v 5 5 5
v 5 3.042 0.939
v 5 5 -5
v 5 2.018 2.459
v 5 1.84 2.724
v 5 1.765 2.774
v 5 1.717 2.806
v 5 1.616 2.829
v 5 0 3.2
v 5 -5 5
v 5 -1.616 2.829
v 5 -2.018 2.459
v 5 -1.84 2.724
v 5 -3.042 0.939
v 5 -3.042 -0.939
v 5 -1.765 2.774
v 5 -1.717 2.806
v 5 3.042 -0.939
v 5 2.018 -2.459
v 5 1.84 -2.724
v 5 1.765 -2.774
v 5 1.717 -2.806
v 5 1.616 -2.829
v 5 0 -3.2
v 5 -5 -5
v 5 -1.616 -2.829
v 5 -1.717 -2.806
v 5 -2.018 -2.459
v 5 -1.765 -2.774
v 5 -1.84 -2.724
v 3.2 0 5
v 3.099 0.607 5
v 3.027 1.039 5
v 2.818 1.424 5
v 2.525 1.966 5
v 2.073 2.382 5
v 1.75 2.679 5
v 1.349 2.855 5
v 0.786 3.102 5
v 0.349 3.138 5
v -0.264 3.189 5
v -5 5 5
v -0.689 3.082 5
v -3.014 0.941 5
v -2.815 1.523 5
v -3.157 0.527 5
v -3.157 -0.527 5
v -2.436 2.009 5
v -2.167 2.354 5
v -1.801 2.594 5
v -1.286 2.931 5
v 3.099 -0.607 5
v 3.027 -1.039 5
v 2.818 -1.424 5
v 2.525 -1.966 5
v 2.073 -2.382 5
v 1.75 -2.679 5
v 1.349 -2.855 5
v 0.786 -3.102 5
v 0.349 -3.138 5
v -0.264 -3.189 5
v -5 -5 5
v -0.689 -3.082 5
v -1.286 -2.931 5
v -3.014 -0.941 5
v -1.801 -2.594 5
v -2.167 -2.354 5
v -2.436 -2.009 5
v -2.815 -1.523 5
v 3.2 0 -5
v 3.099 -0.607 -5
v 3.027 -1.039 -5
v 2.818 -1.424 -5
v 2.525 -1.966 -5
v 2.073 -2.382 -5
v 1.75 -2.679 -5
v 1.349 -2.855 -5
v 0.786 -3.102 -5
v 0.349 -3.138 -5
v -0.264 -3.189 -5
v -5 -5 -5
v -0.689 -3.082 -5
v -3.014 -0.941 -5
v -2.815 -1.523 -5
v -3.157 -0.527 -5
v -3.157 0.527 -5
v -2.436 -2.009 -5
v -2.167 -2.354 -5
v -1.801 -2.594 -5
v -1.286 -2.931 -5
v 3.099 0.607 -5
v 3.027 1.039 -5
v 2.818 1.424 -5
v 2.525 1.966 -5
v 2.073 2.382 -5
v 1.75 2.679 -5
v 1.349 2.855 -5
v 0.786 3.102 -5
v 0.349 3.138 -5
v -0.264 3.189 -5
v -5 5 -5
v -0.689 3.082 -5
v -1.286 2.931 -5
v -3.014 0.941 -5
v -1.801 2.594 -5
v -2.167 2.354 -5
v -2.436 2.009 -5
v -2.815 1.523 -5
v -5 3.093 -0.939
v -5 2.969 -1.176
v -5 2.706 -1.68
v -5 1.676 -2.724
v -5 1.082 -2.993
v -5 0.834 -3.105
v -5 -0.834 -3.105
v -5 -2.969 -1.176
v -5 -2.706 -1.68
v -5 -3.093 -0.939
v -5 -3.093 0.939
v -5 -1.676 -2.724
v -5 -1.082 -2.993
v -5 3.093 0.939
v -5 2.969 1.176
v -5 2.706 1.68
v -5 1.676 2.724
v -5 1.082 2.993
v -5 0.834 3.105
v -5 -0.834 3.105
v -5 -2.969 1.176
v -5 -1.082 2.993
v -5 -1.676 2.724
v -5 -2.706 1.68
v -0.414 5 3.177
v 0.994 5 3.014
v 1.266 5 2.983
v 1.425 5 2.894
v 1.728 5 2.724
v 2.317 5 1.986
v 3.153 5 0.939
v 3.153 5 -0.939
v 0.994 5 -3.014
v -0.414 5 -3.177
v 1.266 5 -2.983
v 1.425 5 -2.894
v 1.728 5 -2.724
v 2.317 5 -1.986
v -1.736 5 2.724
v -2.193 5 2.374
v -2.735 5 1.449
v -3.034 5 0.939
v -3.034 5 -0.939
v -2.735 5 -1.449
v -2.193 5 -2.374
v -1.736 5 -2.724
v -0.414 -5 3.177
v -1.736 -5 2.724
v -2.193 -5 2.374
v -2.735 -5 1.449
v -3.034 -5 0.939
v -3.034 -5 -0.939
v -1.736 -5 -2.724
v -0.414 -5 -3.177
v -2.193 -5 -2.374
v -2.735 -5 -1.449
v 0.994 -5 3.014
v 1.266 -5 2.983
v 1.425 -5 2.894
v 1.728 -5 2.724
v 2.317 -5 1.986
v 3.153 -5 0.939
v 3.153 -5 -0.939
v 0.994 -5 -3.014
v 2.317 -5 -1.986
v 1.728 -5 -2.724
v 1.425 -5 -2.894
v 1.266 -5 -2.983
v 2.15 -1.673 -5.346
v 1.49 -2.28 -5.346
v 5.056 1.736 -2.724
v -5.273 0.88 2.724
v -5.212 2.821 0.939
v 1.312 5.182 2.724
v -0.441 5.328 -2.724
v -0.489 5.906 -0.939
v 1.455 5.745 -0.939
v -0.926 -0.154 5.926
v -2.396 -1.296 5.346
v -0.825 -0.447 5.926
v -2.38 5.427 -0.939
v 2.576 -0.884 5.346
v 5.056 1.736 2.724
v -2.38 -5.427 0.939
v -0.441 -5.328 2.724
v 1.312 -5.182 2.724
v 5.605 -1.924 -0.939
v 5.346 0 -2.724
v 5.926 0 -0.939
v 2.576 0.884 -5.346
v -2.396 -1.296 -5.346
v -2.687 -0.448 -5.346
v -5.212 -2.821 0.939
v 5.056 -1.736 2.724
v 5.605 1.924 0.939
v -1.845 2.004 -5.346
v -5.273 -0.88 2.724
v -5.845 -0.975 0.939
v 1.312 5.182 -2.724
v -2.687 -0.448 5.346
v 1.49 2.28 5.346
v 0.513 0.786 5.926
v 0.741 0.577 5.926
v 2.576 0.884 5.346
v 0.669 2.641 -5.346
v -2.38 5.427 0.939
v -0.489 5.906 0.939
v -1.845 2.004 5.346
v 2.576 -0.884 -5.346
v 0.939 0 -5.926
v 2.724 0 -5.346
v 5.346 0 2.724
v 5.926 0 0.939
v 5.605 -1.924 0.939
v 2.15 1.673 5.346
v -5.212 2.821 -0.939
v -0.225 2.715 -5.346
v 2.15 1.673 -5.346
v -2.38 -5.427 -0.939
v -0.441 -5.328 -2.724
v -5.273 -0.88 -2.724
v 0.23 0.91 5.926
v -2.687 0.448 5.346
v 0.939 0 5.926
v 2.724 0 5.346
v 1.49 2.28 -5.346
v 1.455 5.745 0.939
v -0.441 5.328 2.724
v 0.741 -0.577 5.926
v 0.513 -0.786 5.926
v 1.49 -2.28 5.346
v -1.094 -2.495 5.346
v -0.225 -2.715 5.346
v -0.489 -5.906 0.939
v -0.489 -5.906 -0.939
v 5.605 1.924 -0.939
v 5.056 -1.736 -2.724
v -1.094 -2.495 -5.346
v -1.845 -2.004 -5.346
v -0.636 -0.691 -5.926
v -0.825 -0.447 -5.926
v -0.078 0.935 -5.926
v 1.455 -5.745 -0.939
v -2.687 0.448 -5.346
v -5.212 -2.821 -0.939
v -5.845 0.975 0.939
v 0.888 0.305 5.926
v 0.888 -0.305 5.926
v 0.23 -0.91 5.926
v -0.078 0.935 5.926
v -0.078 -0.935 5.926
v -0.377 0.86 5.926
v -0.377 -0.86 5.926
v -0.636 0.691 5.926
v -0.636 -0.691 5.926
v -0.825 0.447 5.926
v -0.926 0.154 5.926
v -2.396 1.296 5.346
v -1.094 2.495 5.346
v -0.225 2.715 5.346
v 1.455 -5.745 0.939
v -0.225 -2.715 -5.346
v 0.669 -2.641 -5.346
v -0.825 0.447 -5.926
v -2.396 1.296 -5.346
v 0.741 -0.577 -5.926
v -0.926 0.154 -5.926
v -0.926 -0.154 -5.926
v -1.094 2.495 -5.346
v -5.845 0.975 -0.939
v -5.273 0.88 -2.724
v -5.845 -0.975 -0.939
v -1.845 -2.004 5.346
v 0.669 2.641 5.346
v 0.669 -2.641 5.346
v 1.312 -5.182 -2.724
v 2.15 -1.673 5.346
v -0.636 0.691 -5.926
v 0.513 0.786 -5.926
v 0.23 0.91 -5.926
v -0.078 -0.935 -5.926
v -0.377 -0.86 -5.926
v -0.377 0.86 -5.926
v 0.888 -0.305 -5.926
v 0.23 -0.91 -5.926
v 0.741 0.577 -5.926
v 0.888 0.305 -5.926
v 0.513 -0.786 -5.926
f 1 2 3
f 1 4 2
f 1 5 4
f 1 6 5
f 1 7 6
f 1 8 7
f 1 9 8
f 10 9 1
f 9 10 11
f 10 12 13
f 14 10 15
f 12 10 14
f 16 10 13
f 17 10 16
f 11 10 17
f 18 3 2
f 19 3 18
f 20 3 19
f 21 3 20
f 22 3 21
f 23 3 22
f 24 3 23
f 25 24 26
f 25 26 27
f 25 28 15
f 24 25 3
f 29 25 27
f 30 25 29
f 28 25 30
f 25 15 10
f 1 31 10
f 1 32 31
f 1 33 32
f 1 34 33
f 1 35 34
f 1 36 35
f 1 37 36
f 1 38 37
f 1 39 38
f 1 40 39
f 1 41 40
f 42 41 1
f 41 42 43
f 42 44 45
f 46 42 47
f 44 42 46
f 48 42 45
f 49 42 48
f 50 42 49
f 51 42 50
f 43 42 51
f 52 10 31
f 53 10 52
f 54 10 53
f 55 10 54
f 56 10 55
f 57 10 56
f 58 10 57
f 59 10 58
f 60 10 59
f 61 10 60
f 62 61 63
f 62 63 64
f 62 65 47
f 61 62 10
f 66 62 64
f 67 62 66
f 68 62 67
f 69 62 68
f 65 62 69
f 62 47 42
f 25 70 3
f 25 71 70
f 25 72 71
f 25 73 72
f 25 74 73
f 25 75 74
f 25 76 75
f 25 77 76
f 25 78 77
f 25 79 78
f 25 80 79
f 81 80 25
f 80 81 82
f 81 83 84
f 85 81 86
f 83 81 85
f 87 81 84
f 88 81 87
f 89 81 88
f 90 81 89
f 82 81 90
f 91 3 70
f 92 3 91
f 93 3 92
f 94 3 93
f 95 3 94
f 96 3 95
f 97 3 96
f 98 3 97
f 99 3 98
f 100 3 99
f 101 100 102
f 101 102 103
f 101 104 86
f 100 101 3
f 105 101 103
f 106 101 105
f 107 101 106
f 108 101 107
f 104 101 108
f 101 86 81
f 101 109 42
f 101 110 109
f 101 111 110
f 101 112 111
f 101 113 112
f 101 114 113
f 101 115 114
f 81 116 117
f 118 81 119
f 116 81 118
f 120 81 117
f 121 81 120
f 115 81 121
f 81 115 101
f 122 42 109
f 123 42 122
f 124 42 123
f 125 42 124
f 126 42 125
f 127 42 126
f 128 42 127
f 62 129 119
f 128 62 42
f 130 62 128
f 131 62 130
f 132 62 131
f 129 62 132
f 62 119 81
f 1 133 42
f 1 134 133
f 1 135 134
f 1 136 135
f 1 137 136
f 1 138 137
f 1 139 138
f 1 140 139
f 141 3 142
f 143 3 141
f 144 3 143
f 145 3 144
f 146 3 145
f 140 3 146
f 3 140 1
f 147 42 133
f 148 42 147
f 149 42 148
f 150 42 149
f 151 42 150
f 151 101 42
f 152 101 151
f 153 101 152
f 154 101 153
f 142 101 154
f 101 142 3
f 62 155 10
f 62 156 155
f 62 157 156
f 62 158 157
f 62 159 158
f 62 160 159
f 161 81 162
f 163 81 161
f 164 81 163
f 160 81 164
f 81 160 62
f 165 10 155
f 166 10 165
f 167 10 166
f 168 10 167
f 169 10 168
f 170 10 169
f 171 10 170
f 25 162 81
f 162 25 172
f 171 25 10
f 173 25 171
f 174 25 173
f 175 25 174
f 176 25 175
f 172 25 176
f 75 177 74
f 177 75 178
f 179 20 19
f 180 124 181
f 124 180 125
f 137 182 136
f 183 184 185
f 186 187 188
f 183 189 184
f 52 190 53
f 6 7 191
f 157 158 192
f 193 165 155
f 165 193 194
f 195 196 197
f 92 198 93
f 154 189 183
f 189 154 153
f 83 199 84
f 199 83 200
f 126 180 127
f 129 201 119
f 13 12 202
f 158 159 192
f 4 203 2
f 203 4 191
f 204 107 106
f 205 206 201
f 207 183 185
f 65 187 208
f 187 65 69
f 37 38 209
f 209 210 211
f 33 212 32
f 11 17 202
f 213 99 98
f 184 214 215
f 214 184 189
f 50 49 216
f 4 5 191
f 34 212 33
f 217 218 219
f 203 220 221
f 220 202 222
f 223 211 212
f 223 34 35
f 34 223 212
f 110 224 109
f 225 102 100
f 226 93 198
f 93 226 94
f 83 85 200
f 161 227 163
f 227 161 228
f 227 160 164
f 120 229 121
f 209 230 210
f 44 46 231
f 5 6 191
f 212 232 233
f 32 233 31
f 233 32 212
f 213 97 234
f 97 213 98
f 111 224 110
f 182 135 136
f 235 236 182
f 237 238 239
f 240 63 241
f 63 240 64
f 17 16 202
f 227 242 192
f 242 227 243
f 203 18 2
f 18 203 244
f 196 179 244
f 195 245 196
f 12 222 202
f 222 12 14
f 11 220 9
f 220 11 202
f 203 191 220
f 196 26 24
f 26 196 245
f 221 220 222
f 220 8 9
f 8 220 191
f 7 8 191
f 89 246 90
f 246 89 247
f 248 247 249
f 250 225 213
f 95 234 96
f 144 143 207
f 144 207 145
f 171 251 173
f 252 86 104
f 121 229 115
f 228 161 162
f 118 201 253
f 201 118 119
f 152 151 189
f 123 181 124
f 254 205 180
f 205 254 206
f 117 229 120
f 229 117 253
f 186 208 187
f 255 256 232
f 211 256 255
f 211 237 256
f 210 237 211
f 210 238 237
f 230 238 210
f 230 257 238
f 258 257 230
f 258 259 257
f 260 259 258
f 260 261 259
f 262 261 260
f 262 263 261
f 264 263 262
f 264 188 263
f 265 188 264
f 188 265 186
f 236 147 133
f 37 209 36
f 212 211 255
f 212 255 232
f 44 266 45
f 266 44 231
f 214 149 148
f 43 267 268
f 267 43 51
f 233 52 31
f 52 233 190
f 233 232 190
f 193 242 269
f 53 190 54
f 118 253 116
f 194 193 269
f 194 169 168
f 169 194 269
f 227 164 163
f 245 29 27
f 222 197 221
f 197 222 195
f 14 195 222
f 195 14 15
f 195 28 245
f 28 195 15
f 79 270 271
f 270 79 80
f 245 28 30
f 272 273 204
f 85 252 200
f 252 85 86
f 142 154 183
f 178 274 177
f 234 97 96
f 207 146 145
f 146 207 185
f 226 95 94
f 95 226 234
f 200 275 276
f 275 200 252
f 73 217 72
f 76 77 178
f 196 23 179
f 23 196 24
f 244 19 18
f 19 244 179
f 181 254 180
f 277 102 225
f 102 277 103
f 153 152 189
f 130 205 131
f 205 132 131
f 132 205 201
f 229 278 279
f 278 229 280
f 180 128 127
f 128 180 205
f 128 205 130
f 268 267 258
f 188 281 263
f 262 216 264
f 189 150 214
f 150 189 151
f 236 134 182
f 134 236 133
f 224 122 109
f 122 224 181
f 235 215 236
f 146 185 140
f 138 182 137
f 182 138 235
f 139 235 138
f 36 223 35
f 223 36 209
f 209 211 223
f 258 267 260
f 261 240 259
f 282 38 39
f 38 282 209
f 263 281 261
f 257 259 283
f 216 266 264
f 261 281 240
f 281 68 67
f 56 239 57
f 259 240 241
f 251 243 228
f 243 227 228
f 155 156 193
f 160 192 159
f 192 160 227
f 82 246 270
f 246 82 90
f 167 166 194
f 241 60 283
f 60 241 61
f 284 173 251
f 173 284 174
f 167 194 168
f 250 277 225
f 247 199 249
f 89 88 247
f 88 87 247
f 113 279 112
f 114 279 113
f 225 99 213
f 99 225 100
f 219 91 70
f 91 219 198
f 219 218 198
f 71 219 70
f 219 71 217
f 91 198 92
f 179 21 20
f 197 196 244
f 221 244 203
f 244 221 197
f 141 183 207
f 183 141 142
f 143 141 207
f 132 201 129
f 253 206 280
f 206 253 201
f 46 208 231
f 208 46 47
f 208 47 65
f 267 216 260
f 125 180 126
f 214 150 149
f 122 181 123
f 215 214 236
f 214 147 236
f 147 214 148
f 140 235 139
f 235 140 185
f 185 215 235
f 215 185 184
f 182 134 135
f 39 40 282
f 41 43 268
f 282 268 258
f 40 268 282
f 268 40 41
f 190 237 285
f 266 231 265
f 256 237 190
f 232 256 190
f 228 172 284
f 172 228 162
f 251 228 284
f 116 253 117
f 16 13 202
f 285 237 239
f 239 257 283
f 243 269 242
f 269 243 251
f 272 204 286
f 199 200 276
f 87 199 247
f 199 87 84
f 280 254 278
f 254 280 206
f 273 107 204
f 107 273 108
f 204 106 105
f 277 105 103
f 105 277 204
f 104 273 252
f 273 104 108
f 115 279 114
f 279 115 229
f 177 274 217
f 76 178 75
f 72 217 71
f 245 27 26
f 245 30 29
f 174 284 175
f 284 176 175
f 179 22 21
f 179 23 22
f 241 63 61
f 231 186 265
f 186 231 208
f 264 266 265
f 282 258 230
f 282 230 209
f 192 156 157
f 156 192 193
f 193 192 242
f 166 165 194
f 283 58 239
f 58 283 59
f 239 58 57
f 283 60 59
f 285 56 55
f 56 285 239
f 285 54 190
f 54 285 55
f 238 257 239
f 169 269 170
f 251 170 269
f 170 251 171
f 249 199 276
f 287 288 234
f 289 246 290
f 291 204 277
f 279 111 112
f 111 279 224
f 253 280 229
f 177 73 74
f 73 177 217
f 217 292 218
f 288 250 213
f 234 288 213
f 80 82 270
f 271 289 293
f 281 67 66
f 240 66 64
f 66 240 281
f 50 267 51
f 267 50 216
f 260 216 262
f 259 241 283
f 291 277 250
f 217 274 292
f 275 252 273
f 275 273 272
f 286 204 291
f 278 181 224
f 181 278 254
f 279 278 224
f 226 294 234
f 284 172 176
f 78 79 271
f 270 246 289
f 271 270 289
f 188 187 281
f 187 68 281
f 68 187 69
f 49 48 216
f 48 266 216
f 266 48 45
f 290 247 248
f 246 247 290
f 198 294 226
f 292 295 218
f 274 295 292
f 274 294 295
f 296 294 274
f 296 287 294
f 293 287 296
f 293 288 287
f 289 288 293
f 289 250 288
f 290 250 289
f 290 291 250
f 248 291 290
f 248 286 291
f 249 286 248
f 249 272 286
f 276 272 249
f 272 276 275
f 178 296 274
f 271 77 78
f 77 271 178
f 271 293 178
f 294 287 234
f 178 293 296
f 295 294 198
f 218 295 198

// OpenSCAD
// The Cube is 10mm wide
// The Sphere has a diameter of 12mm
// That's why you can only see parts of the Sphere
cube(size = [10, 10, 10], center = true);
sphere(r = 6);
